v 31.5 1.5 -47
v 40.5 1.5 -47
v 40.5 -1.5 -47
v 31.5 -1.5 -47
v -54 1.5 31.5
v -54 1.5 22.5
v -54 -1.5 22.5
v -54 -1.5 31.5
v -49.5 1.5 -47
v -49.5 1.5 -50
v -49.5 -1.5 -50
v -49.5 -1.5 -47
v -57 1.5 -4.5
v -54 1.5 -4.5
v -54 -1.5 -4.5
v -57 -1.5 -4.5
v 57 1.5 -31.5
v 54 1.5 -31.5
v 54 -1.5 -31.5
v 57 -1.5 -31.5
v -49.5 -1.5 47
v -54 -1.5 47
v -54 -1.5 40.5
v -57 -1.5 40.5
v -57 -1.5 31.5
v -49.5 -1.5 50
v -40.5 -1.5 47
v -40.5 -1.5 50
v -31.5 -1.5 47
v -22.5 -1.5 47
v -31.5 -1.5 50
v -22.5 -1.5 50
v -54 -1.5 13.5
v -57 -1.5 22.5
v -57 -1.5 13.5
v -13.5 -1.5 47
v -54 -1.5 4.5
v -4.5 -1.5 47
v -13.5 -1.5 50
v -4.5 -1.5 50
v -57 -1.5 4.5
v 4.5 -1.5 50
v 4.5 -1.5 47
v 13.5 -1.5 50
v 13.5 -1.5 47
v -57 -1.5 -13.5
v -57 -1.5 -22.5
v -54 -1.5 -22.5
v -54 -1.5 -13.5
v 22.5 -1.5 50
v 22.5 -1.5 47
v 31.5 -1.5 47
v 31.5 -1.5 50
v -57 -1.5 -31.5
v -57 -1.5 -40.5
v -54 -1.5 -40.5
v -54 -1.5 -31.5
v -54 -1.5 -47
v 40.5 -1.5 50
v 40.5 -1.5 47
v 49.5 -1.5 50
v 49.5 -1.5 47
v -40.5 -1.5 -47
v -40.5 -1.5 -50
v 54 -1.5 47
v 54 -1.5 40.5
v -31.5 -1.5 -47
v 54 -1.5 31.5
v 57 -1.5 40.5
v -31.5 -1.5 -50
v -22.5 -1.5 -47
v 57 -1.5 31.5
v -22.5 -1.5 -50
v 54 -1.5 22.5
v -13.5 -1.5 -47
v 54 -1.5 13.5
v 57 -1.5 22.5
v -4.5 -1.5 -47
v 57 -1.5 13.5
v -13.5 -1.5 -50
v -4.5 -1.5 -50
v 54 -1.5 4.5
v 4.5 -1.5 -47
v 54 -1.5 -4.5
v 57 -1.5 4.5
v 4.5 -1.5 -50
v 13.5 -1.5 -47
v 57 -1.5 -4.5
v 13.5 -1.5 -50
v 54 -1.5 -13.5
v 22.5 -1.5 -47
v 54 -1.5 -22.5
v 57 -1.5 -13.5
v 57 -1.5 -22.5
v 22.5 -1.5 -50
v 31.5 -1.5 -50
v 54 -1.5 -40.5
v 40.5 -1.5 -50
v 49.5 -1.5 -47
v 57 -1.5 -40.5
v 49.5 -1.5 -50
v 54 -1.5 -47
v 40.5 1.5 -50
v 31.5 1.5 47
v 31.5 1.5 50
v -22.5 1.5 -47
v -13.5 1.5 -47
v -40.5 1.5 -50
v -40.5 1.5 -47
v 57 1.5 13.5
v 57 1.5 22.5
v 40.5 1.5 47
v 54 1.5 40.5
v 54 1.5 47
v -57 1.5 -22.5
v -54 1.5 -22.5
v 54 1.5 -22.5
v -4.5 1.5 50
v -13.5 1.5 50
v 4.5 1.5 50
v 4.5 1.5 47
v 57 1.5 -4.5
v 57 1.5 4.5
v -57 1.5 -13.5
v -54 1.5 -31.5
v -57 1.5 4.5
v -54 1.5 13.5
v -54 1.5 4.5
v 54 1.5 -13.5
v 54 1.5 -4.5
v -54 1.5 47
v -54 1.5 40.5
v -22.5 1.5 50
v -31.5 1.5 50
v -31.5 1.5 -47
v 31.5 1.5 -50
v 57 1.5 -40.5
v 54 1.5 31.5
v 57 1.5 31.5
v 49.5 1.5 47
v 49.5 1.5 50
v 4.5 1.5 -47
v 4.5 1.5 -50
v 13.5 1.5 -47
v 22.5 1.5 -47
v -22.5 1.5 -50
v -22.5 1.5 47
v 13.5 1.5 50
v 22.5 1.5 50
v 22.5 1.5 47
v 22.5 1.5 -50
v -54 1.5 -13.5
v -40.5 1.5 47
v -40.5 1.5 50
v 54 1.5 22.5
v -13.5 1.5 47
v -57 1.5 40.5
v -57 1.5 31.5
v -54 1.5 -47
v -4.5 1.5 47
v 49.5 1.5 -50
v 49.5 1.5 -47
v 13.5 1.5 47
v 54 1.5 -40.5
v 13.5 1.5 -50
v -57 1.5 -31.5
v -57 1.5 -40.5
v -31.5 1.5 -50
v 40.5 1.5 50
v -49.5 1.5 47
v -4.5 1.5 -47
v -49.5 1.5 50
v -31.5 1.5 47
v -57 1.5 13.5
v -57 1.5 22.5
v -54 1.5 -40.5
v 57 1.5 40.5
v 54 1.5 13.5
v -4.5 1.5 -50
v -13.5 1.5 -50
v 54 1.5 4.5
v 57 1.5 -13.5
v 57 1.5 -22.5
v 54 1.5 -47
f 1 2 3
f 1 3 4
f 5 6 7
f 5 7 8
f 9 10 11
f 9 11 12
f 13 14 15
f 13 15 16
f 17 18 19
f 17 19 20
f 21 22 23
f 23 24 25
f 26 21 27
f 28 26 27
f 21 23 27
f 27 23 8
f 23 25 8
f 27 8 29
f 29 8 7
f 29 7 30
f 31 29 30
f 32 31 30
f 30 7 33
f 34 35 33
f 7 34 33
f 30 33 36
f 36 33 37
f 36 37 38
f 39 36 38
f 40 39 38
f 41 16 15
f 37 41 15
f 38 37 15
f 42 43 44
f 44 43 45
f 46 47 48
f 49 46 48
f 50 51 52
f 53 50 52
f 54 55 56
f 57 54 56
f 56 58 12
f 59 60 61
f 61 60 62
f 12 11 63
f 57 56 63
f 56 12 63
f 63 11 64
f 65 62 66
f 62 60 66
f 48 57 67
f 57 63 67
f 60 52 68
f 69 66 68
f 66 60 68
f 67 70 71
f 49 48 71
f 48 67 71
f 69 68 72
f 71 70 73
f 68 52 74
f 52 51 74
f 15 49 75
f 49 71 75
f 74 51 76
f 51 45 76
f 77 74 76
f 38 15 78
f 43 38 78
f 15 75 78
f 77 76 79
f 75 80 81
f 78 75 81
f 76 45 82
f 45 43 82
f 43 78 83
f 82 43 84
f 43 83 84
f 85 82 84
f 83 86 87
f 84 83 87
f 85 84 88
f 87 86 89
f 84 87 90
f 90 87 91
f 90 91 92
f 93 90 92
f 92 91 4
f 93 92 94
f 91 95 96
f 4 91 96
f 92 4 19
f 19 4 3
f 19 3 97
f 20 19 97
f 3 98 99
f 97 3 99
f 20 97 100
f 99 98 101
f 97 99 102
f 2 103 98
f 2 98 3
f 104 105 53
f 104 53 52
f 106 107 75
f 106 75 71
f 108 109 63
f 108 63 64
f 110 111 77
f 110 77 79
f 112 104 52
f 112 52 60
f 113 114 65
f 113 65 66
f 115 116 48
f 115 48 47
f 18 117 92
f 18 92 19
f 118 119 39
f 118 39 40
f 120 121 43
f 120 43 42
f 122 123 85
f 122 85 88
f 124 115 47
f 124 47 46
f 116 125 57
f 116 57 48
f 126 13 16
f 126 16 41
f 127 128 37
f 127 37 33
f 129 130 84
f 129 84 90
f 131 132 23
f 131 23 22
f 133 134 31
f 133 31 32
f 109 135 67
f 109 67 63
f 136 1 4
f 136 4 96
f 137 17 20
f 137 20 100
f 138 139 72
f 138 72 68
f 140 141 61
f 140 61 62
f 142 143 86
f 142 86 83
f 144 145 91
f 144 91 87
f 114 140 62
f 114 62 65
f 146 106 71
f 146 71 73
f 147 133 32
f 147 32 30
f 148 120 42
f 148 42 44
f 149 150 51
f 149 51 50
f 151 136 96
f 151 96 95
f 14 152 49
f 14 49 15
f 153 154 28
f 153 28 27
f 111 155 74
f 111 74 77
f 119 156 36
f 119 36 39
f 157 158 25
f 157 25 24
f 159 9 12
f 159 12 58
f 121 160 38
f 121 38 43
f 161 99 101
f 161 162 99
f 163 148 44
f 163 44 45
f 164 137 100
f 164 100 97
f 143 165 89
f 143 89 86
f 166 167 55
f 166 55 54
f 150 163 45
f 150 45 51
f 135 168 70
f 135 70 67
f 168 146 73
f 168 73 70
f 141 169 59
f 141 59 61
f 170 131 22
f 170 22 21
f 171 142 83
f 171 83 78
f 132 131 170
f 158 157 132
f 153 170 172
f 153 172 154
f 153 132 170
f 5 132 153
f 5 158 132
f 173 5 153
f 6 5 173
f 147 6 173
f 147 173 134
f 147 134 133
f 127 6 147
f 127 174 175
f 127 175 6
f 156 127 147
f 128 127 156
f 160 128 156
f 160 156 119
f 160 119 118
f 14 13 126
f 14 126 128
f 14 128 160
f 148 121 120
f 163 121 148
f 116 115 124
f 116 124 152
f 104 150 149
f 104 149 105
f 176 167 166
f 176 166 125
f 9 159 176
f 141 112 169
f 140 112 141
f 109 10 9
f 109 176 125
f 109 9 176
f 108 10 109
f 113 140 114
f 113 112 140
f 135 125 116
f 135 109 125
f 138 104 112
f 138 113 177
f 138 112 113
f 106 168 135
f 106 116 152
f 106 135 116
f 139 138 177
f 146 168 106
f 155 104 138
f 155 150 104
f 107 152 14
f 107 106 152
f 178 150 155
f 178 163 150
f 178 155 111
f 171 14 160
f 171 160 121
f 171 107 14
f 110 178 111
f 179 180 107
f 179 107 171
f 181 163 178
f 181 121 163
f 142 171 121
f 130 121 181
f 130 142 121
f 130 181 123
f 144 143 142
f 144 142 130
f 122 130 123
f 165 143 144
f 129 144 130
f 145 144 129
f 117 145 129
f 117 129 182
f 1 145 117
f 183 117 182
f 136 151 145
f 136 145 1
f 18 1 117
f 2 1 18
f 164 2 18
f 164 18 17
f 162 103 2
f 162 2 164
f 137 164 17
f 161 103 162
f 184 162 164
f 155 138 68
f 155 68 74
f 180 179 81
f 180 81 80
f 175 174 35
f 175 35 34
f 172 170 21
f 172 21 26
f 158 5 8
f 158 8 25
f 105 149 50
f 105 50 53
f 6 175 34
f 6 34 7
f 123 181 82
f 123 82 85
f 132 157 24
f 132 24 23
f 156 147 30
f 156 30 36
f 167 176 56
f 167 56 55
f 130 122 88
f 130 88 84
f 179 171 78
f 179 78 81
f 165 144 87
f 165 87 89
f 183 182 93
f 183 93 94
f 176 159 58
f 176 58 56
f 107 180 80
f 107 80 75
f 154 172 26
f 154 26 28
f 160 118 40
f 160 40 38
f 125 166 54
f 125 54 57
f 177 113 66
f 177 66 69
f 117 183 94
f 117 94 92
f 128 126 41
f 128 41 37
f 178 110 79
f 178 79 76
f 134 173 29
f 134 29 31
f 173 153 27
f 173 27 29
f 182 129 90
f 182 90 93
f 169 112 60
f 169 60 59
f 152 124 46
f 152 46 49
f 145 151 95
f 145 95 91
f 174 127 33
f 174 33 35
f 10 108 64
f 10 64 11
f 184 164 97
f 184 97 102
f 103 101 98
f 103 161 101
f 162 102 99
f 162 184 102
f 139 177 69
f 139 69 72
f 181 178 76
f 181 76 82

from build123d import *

# Parameters (mm, degrees)
BOSS_EXTRUDE1_DEPTH = 1.5


with BuildPart() as part:
    # Sketch1 → Boss-Extrude1 (new, symmetric)
    with BuildSketch(Plane(origin=(0, 0, 0), x_dir=(1, 0, 0), z_dir=(0, 1, 0))):
        Polygon((49.5, 50), (40.5, 50), (40.5, 47), (31.5, 47), (31.5, 50), (22.5, 50), (22.5, 47), (13.5, 47), (13.5, 50), (4.5, 50), (4.5, 47), (-4.5, 47), (-4.5, 50), (-13.5, 50), (-13.5, 47), (-22.5, 47), (-22.5, 50), (-31.5, 50), (-31.5, 47), (-40.5, 47), (-40.5, 50), (-49.5, 50), (-49.5, 47), (-54, 47), (-54, 40.5), (-57, 40.5), (-57, 31.5), (-54, 31.5), (-54, 22.5), (-57, 22.5), (-57, 13.5), (-54, 13.5), (-54, 4.5), (-57, 4.5), (-57, -4.5), (-54, -4.5), (-54, -13.5), (-57, -13.5), (-57, -22.5), (-54, -22.5), (-54, -31.5), (-57, -31.5), (-57, -40.5), (-54, -40.5), (-54, -47), (-49.5, -47), (-49.5, -50), (-40.5, -50), (-40.5, -47), (-31.5, -47), (-31.5, -50), (-22.5, -50), (-22.5, -47), (-13.5, -47), (-13.5, -50), (-4.5, -50), (-4.5, -47), (4.5, -47), (4.5, -50), (13.5, -50), (13.5, -47), (22.5, -47), (22.5, -50), (31.5, -50), (31.5, -47), (40.5, -47), (40.5, -50), (49.5, -50), (49.5, -47), (54, -47), (54, -40.5), (57, -40.5), (57, -31.5), (54, -31.5), (54, -22.5), (57, -22.5), (57, -13.5), (54, -13.5), (54, -4.5), (57, -4.5), (57, 4.5), (54, 4.5), (54, 13.5), (57, 13.5), (57, 22.5), (54, 22.5), (54, 31.5), (57, 31.5), (57, 40.5), (54, 40.5), (54, 47), (49.5, 47), align=None)
    extrude(amount=BOSS_EXTRUDE1_DEPTH, both=True)


solid = part.part
